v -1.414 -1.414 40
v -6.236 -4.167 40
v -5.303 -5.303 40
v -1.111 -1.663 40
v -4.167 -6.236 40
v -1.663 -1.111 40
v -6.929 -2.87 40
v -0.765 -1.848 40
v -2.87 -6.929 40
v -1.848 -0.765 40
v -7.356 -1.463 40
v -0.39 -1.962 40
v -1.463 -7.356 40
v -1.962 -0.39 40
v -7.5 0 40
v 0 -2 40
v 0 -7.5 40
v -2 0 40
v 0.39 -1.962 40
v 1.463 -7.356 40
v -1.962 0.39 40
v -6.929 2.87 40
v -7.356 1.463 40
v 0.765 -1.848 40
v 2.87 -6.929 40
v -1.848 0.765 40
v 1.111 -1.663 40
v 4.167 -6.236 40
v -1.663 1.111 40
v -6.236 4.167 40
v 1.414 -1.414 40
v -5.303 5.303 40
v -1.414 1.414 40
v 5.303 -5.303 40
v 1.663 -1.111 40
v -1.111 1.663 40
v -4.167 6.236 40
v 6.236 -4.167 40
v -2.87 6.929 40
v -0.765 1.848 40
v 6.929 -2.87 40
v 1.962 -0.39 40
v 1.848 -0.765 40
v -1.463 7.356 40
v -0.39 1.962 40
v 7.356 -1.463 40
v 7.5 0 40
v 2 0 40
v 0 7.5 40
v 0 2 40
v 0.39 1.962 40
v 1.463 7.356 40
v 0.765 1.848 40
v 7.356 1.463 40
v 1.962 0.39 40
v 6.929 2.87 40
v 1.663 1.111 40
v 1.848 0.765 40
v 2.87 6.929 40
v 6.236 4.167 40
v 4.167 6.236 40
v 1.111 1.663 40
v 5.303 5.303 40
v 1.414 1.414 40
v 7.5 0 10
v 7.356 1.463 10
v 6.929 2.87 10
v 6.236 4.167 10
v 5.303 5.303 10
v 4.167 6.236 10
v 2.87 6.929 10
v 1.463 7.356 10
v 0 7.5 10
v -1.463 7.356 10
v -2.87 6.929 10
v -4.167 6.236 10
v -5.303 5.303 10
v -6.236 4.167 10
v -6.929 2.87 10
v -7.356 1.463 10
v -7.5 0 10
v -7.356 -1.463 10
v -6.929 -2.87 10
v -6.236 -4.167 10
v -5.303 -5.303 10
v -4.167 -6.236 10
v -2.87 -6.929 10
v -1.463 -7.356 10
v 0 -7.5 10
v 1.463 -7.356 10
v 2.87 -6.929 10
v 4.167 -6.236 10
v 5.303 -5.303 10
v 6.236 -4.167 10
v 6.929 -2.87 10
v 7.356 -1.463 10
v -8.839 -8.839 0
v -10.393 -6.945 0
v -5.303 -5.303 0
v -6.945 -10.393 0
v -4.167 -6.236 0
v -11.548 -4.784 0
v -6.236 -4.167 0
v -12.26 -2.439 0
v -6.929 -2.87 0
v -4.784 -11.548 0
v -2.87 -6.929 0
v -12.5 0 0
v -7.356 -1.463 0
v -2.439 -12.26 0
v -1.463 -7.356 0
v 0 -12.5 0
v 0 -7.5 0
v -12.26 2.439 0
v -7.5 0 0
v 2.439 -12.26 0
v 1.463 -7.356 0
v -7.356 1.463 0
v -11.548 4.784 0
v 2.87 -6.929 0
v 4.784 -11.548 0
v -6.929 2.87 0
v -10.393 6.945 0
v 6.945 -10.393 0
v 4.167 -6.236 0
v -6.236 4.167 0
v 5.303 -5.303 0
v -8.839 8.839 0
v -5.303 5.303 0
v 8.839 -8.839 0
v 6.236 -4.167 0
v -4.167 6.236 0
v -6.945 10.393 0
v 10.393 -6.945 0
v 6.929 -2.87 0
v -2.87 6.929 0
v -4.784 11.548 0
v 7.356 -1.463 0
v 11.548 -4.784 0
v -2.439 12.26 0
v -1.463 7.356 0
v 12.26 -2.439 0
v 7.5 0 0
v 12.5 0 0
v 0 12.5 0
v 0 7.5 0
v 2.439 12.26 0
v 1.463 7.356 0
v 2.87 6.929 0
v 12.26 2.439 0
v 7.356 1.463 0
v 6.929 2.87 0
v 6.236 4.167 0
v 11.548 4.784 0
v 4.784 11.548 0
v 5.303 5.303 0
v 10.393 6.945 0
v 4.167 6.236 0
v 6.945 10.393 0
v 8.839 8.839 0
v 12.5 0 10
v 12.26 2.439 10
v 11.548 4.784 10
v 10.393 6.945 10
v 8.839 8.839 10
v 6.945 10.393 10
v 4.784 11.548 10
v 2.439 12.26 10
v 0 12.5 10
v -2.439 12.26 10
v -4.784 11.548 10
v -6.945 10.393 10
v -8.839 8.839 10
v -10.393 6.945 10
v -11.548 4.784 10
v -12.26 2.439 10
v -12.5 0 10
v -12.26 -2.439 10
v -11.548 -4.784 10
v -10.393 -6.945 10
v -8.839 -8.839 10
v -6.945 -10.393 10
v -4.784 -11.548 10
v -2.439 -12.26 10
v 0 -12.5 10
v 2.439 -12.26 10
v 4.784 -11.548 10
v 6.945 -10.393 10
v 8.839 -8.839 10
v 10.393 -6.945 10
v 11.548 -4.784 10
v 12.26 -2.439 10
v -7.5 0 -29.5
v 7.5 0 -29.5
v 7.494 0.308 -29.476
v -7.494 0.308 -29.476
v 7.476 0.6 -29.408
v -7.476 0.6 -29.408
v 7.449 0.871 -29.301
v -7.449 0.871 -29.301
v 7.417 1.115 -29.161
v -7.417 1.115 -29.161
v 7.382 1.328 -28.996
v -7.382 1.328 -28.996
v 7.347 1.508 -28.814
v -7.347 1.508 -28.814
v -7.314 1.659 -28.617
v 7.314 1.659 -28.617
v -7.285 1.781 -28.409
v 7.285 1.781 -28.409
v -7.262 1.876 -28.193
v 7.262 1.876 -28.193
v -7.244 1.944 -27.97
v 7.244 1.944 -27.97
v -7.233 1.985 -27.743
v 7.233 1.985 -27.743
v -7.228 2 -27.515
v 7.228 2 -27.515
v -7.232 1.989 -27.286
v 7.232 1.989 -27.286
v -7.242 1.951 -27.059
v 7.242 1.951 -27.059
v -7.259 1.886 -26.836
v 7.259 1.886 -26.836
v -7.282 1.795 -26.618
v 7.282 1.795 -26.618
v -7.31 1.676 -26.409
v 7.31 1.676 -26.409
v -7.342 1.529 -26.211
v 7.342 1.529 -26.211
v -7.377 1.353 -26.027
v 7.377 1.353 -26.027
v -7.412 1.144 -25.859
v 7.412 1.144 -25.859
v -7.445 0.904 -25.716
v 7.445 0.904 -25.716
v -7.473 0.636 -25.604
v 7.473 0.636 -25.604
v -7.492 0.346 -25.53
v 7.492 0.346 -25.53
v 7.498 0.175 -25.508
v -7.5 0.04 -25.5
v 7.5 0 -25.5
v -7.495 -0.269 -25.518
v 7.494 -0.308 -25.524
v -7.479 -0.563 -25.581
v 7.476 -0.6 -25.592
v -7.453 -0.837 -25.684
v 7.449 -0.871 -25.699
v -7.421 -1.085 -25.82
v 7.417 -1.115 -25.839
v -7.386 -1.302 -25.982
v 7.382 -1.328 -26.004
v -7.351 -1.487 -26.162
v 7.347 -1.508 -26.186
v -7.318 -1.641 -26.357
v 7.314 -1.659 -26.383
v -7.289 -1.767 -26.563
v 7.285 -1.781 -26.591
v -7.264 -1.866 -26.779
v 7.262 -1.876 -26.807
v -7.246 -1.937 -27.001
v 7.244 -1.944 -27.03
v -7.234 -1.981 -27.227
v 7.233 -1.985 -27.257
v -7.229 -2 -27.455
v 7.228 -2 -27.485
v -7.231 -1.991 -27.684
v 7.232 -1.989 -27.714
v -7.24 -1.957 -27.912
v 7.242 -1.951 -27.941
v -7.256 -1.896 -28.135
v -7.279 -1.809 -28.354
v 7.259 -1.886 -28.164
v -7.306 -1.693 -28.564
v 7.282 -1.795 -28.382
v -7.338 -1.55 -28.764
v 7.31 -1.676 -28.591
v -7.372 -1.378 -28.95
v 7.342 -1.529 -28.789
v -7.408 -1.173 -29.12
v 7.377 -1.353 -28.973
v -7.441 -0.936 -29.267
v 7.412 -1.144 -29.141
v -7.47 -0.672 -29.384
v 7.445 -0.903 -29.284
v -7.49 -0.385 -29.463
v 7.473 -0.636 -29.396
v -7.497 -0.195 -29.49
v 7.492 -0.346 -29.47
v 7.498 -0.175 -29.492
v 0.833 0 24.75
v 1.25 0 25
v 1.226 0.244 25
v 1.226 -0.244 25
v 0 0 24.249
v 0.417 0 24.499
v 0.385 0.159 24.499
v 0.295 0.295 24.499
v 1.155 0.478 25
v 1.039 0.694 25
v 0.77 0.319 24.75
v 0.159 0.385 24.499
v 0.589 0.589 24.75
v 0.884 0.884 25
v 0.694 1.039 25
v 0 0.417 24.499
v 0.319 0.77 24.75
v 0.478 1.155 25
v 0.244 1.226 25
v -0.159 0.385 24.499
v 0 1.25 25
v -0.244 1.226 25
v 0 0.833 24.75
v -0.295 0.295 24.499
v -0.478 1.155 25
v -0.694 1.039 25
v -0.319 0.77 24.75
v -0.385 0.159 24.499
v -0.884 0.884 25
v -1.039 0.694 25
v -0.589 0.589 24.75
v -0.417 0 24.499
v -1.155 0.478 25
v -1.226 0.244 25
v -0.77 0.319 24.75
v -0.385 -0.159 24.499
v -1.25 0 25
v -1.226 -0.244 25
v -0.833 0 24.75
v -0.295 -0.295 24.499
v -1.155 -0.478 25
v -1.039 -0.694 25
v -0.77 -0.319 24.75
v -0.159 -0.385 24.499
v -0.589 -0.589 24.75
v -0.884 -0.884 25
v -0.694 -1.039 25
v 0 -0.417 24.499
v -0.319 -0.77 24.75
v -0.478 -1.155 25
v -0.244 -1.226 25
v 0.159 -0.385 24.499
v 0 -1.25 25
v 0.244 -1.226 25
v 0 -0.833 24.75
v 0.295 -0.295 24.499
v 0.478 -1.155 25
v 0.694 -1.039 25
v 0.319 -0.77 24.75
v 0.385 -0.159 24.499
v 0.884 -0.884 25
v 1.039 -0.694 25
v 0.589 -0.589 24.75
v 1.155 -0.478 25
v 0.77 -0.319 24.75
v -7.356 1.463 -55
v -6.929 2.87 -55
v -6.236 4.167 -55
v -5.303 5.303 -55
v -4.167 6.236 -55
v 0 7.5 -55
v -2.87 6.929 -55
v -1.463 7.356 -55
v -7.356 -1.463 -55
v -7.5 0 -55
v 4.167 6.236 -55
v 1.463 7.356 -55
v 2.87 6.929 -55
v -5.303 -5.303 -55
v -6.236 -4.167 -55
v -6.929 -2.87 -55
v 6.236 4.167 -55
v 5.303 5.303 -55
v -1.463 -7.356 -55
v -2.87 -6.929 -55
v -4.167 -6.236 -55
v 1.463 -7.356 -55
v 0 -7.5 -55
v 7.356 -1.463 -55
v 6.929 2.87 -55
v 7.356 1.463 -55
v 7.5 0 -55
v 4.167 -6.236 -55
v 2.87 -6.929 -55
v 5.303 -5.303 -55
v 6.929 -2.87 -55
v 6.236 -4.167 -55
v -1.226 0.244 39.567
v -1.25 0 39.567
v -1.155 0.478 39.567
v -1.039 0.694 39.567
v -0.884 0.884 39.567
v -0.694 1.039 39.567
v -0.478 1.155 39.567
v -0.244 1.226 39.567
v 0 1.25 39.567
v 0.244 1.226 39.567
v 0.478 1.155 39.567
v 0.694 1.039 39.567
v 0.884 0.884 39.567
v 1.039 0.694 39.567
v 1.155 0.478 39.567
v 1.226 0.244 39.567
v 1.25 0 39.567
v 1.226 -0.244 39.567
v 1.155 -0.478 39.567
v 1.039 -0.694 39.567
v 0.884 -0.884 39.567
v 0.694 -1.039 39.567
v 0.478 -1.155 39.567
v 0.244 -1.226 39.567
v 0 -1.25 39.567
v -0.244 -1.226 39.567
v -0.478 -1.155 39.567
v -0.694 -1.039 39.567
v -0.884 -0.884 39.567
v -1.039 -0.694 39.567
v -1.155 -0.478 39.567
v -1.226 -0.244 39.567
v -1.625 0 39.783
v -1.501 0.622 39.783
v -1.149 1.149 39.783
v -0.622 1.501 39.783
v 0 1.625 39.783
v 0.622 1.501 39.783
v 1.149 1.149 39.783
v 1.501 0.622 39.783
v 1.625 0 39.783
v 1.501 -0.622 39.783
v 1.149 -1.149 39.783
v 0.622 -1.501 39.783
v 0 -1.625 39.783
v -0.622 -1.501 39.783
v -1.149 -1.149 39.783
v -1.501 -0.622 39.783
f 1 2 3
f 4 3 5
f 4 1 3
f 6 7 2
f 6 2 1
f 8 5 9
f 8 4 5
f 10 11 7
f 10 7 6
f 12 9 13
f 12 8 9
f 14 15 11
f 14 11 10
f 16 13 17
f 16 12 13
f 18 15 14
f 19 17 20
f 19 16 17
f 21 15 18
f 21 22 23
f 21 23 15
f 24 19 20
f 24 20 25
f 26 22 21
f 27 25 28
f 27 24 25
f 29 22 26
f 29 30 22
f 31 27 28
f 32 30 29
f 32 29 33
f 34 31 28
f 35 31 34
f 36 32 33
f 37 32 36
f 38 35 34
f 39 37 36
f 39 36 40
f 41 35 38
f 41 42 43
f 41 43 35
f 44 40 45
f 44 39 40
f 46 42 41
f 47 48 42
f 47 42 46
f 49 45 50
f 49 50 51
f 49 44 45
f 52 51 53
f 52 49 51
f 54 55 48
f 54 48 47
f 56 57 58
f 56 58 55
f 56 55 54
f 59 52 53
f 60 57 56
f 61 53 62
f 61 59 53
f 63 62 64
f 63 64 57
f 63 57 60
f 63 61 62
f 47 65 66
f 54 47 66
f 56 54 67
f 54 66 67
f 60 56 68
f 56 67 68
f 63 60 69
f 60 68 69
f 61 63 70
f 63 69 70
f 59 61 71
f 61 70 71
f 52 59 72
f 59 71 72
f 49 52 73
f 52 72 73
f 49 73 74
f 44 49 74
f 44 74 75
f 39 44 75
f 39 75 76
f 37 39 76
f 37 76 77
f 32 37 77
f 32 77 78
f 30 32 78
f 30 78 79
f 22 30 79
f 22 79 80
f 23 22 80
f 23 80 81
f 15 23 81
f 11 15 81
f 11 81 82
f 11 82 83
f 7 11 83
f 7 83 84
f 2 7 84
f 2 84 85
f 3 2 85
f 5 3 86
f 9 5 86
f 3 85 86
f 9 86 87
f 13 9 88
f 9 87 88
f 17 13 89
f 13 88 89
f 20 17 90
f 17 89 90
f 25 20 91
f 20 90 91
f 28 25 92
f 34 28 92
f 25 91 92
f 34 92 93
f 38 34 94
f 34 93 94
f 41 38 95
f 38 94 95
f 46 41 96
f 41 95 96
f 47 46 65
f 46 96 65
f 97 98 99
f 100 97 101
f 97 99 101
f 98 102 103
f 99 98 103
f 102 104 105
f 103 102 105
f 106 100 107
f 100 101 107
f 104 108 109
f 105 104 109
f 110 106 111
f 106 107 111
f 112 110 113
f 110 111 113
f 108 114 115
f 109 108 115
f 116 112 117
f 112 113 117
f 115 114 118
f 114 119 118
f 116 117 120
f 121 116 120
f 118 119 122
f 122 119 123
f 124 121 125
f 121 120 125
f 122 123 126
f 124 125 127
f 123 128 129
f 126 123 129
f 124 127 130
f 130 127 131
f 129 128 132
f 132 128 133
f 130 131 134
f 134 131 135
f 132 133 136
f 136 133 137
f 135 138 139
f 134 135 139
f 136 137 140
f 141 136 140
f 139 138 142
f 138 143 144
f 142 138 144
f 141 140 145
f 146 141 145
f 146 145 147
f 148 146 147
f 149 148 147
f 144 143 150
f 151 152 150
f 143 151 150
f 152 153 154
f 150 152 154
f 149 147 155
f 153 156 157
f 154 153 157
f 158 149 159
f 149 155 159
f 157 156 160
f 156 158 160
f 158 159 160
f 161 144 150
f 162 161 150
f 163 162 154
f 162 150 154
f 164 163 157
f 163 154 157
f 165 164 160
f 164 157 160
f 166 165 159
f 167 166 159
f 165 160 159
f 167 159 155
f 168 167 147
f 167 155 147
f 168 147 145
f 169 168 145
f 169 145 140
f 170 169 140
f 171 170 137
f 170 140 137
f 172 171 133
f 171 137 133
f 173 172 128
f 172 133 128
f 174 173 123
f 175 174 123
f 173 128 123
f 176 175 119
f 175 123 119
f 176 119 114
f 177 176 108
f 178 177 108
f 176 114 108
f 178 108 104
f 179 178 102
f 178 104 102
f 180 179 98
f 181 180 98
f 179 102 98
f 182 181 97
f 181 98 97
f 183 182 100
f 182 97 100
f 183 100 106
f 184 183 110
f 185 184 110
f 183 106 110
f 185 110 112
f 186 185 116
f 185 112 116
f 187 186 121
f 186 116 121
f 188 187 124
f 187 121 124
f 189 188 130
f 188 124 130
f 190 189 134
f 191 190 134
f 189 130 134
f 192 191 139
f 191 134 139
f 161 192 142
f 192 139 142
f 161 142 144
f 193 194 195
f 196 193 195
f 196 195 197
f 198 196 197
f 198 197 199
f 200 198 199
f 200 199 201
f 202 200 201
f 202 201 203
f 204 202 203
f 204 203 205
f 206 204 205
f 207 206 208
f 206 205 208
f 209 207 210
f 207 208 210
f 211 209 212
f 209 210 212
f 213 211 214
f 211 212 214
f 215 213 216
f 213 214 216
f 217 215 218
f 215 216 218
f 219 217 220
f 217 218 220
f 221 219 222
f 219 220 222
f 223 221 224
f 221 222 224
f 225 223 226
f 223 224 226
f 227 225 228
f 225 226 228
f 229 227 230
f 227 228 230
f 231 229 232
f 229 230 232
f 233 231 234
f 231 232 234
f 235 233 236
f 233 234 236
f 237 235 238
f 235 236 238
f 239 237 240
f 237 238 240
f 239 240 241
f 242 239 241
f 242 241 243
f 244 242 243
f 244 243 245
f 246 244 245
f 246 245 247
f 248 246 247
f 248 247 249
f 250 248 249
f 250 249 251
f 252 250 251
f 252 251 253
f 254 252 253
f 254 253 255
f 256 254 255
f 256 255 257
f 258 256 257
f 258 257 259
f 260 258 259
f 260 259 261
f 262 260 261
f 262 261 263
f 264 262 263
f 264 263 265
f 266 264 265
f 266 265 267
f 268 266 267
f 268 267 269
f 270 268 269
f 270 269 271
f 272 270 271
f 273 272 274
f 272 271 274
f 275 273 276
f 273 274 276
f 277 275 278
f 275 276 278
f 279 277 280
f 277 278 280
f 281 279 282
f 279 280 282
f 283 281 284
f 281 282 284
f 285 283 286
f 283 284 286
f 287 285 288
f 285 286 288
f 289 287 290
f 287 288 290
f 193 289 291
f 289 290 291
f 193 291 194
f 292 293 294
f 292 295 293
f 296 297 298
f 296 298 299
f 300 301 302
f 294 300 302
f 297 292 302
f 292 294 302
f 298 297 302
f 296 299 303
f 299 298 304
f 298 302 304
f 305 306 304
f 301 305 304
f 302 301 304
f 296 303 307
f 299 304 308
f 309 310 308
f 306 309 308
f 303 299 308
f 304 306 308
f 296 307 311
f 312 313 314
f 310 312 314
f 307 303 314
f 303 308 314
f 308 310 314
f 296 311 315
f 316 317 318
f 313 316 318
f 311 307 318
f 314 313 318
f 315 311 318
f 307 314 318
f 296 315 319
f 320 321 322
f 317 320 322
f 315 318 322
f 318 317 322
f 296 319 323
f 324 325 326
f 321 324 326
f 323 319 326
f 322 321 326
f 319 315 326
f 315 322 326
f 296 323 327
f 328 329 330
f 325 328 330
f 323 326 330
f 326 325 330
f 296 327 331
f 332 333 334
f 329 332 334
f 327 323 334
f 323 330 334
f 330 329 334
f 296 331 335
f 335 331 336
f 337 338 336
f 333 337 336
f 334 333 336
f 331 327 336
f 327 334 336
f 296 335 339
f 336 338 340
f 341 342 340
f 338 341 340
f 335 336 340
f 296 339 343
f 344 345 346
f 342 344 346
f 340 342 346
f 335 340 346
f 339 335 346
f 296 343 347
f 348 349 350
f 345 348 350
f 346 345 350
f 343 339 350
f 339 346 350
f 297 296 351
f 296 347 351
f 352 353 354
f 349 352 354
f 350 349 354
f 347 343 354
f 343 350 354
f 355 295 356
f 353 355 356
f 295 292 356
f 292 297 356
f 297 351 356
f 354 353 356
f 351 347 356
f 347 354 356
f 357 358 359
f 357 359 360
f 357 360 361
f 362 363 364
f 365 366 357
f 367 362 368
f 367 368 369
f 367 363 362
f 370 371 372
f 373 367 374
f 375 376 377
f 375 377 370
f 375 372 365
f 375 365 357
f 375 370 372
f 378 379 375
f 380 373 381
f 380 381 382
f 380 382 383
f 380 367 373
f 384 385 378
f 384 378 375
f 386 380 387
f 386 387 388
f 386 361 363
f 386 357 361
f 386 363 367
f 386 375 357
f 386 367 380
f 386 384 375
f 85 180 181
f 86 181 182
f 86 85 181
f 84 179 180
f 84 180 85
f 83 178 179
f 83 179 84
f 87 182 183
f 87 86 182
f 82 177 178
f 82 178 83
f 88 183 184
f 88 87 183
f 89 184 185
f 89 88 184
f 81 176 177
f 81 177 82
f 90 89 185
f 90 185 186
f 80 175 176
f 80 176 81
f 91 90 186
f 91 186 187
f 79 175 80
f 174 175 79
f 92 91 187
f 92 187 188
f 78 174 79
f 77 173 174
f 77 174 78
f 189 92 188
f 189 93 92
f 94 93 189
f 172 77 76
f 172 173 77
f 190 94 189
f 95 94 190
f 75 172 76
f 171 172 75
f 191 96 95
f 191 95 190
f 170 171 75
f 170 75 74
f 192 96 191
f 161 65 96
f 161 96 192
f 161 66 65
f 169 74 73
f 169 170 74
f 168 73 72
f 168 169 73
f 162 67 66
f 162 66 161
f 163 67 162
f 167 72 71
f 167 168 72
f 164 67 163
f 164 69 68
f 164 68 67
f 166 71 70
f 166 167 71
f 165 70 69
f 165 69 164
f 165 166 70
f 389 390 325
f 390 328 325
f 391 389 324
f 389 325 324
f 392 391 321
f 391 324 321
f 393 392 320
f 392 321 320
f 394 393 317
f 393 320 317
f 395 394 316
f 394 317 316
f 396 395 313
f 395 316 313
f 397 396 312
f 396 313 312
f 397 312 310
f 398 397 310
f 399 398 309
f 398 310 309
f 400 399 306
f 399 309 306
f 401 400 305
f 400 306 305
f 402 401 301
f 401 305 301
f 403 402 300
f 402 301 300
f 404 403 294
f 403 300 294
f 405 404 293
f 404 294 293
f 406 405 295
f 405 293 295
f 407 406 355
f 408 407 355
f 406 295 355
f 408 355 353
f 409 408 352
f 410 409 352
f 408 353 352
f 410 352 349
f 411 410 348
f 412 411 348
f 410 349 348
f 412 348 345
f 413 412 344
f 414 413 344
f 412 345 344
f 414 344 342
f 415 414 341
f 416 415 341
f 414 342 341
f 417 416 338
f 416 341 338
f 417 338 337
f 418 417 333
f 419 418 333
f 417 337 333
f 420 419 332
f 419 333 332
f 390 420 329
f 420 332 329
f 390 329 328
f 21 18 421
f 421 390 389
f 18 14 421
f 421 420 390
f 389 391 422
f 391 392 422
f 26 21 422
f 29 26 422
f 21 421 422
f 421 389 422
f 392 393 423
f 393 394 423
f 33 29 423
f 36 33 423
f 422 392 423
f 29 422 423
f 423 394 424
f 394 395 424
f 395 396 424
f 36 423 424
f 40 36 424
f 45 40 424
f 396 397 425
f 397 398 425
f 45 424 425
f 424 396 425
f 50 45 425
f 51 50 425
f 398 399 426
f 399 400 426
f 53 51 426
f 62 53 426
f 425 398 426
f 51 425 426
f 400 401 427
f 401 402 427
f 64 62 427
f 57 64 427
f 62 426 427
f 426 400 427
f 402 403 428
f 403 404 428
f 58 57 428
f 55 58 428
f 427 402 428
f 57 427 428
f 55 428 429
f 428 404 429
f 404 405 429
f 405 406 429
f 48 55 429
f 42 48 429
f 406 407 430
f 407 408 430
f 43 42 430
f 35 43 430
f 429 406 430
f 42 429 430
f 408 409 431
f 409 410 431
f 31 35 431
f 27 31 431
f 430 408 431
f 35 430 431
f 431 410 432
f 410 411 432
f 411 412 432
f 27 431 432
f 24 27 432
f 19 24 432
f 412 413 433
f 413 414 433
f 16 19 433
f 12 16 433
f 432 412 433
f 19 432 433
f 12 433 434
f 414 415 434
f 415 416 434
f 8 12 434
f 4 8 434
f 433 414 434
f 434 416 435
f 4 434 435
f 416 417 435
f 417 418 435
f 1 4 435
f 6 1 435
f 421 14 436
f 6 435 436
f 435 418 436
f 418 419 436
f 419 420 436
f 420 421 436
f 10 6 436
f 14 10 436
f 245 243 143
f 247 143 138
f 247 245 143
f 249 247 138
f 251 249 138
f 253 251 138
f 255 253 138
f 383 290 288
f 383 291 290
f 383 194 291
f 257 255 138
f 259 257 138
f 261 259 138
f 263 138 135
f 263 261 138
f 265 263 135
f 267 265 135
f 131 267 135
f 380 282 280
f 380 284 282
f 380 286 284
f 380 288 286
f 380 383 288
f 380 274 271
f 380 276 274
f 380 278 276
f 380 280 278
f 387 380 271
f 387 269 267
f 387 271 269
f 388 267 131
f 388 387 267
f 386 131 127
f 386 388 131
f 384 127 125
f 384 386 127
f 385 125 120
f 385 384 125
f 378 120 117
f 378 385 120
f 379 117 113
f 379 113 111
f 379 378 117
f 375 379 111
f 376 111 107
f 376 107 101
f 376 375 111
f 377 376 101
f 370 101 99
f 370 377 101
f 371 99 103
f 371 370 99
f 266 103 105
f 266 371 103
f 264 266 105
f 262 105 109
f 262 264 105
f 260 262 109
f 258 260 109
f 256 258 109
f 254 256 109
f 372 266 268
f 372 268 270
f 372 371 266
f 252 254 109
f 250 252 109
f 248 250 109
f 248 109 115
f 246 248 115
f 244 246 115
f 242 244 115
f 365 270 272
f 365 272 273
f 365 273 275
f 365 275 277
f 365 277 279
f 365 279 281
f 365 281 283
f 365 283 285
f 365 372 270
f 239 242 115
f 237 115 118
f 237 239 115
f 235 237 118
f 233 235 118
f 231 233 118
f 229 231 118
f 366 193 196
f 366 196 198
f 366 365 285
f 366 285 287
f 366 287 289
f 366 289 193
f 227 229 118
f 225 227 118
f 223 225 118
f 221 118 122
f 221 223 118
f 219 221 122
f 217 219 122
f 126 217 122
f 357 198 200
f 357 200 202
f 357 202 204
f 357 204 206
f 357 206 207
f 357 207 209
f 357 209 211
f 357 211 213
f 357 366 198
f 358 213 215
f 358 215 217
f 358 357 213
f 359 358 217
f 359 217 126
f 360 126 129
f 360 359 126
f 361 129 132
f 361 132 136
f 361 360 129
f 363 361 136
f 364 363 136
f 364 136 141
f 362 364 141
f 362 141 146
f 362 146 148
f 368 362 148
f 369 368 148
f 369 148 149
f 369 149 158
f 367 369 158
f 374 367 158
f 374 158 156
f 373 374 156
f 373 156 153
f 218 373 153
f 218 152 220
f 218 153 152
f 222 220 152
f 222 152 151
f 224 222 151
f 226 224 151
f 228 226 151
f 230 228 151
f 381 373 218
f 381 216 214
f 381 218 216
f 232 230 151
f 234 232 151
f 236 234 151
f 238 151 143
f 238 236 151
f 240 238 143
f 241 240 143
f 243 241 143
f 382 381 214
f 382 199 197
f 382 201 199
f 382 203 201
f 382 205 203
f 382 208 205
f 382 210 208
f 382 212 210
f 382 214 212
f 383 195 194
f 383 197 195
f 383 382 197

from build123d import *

# Parameters (mm, degrees)
SKETCH1_R                       = 12.5
F_25MM_DIA_DEPTH                = 10
F_15MM_START                    = -10
SKETCH2_R                       = 7.5
F_15MM_DIA_BEARING_END_DEPTH    = 40
F_15MM_START_2                  = 55
SKETCH3_R                       = 7.5
F_15MM_DIA_GEAR_END_DEPTH       = 55
M3X0_5_TAPPED_HOLE1_D           = 2.5
M3X0_5_TAPPED_HOLE1_DEPTH       = 15
M3X0_5_TAPPED_HOLE1_CSINK_D     = 4
M3X0_5_TAPPED_HOLE1_CSINK_ANGLE = 120
M3X0_5_TAPPED_HOLE1_TIP         = 0.751075774
SKETCH7_R                       = 2
CUT_EXTRUDE1_DEPTH              = 60.843546018


with BuildPart() as part:
    # Sketch1 → 25mm dia (new body)
    with BuildSketch(Plane.XY):
        Circle(SKETCH1_R)
    extrude(amount=F_25MM_DIA_DEPTH)

    # Sketch2 → 15mm dia bearing end (add)
    with BuildSketch(Plane.XY.offset(10).offset(F_15MM_START)):
        Circle(SKETCH2_R)
    extrude(amount=F_15MM_DIA_BEARING_END_DEPTH)

    # Sketch3 → 15mm dia gear end (add)
    with BuildSketch(Plane(origin=(0, 0, 0), x_dir=(-1, 0, 0), z_dir=(0, 0, -1)).offset(F_15MM_START_2)):
        with Locations(Location((0, 0, 0), (0, 0, 180))):
            Circle(SKETCH3_R)
    extrude(amount=-F_15MM_DIA_GEAR_END_DEPTH)

    # M3x0.5 Tapped Hole1
    with Locations(Plane.XY.offset(40)):
        with Locations((0, 0)):
            CounterSinkHole(M3X0_5_TAPPED_HOLE1_D / 2, M3X0_5_TAPPED_HOLE1_CSINK_D / 2, depth=M3X0_5_TAPPED_HOLE1_DEPTH, counter_sink_angle=M3X0_5_TAPPED_HOLE1_CSINK_ANGLE)
            with Locations((0, 0, -(M3X0_5_TAPPED_HOLE1_DEPTH + M3X0_5_TAPPED_HOLE1_TIP / 2))):  # 118° drill point
                Cone(0, M3X0_5_TAPPED_HOLE1_D / 2, M3X0_5_TAPPED_HOLE1_TIP, mode=Mode.SUBTRACT)

    # Sketch7 → Cut-Extrude1 (cut, through all)
    with BuildSketch(Plane(origin=(7.5, 0, 0), x_dir=(0, 0, -1), z_dir=(1, 0, 0))):
        with Locations((27.5, 0)):
            Circle(SKETCH7_R)
    extrude(amount=-CUT_EXTRUDE1_DEPTH, mode=Mode.SUBTRACT)


solid = part.part
